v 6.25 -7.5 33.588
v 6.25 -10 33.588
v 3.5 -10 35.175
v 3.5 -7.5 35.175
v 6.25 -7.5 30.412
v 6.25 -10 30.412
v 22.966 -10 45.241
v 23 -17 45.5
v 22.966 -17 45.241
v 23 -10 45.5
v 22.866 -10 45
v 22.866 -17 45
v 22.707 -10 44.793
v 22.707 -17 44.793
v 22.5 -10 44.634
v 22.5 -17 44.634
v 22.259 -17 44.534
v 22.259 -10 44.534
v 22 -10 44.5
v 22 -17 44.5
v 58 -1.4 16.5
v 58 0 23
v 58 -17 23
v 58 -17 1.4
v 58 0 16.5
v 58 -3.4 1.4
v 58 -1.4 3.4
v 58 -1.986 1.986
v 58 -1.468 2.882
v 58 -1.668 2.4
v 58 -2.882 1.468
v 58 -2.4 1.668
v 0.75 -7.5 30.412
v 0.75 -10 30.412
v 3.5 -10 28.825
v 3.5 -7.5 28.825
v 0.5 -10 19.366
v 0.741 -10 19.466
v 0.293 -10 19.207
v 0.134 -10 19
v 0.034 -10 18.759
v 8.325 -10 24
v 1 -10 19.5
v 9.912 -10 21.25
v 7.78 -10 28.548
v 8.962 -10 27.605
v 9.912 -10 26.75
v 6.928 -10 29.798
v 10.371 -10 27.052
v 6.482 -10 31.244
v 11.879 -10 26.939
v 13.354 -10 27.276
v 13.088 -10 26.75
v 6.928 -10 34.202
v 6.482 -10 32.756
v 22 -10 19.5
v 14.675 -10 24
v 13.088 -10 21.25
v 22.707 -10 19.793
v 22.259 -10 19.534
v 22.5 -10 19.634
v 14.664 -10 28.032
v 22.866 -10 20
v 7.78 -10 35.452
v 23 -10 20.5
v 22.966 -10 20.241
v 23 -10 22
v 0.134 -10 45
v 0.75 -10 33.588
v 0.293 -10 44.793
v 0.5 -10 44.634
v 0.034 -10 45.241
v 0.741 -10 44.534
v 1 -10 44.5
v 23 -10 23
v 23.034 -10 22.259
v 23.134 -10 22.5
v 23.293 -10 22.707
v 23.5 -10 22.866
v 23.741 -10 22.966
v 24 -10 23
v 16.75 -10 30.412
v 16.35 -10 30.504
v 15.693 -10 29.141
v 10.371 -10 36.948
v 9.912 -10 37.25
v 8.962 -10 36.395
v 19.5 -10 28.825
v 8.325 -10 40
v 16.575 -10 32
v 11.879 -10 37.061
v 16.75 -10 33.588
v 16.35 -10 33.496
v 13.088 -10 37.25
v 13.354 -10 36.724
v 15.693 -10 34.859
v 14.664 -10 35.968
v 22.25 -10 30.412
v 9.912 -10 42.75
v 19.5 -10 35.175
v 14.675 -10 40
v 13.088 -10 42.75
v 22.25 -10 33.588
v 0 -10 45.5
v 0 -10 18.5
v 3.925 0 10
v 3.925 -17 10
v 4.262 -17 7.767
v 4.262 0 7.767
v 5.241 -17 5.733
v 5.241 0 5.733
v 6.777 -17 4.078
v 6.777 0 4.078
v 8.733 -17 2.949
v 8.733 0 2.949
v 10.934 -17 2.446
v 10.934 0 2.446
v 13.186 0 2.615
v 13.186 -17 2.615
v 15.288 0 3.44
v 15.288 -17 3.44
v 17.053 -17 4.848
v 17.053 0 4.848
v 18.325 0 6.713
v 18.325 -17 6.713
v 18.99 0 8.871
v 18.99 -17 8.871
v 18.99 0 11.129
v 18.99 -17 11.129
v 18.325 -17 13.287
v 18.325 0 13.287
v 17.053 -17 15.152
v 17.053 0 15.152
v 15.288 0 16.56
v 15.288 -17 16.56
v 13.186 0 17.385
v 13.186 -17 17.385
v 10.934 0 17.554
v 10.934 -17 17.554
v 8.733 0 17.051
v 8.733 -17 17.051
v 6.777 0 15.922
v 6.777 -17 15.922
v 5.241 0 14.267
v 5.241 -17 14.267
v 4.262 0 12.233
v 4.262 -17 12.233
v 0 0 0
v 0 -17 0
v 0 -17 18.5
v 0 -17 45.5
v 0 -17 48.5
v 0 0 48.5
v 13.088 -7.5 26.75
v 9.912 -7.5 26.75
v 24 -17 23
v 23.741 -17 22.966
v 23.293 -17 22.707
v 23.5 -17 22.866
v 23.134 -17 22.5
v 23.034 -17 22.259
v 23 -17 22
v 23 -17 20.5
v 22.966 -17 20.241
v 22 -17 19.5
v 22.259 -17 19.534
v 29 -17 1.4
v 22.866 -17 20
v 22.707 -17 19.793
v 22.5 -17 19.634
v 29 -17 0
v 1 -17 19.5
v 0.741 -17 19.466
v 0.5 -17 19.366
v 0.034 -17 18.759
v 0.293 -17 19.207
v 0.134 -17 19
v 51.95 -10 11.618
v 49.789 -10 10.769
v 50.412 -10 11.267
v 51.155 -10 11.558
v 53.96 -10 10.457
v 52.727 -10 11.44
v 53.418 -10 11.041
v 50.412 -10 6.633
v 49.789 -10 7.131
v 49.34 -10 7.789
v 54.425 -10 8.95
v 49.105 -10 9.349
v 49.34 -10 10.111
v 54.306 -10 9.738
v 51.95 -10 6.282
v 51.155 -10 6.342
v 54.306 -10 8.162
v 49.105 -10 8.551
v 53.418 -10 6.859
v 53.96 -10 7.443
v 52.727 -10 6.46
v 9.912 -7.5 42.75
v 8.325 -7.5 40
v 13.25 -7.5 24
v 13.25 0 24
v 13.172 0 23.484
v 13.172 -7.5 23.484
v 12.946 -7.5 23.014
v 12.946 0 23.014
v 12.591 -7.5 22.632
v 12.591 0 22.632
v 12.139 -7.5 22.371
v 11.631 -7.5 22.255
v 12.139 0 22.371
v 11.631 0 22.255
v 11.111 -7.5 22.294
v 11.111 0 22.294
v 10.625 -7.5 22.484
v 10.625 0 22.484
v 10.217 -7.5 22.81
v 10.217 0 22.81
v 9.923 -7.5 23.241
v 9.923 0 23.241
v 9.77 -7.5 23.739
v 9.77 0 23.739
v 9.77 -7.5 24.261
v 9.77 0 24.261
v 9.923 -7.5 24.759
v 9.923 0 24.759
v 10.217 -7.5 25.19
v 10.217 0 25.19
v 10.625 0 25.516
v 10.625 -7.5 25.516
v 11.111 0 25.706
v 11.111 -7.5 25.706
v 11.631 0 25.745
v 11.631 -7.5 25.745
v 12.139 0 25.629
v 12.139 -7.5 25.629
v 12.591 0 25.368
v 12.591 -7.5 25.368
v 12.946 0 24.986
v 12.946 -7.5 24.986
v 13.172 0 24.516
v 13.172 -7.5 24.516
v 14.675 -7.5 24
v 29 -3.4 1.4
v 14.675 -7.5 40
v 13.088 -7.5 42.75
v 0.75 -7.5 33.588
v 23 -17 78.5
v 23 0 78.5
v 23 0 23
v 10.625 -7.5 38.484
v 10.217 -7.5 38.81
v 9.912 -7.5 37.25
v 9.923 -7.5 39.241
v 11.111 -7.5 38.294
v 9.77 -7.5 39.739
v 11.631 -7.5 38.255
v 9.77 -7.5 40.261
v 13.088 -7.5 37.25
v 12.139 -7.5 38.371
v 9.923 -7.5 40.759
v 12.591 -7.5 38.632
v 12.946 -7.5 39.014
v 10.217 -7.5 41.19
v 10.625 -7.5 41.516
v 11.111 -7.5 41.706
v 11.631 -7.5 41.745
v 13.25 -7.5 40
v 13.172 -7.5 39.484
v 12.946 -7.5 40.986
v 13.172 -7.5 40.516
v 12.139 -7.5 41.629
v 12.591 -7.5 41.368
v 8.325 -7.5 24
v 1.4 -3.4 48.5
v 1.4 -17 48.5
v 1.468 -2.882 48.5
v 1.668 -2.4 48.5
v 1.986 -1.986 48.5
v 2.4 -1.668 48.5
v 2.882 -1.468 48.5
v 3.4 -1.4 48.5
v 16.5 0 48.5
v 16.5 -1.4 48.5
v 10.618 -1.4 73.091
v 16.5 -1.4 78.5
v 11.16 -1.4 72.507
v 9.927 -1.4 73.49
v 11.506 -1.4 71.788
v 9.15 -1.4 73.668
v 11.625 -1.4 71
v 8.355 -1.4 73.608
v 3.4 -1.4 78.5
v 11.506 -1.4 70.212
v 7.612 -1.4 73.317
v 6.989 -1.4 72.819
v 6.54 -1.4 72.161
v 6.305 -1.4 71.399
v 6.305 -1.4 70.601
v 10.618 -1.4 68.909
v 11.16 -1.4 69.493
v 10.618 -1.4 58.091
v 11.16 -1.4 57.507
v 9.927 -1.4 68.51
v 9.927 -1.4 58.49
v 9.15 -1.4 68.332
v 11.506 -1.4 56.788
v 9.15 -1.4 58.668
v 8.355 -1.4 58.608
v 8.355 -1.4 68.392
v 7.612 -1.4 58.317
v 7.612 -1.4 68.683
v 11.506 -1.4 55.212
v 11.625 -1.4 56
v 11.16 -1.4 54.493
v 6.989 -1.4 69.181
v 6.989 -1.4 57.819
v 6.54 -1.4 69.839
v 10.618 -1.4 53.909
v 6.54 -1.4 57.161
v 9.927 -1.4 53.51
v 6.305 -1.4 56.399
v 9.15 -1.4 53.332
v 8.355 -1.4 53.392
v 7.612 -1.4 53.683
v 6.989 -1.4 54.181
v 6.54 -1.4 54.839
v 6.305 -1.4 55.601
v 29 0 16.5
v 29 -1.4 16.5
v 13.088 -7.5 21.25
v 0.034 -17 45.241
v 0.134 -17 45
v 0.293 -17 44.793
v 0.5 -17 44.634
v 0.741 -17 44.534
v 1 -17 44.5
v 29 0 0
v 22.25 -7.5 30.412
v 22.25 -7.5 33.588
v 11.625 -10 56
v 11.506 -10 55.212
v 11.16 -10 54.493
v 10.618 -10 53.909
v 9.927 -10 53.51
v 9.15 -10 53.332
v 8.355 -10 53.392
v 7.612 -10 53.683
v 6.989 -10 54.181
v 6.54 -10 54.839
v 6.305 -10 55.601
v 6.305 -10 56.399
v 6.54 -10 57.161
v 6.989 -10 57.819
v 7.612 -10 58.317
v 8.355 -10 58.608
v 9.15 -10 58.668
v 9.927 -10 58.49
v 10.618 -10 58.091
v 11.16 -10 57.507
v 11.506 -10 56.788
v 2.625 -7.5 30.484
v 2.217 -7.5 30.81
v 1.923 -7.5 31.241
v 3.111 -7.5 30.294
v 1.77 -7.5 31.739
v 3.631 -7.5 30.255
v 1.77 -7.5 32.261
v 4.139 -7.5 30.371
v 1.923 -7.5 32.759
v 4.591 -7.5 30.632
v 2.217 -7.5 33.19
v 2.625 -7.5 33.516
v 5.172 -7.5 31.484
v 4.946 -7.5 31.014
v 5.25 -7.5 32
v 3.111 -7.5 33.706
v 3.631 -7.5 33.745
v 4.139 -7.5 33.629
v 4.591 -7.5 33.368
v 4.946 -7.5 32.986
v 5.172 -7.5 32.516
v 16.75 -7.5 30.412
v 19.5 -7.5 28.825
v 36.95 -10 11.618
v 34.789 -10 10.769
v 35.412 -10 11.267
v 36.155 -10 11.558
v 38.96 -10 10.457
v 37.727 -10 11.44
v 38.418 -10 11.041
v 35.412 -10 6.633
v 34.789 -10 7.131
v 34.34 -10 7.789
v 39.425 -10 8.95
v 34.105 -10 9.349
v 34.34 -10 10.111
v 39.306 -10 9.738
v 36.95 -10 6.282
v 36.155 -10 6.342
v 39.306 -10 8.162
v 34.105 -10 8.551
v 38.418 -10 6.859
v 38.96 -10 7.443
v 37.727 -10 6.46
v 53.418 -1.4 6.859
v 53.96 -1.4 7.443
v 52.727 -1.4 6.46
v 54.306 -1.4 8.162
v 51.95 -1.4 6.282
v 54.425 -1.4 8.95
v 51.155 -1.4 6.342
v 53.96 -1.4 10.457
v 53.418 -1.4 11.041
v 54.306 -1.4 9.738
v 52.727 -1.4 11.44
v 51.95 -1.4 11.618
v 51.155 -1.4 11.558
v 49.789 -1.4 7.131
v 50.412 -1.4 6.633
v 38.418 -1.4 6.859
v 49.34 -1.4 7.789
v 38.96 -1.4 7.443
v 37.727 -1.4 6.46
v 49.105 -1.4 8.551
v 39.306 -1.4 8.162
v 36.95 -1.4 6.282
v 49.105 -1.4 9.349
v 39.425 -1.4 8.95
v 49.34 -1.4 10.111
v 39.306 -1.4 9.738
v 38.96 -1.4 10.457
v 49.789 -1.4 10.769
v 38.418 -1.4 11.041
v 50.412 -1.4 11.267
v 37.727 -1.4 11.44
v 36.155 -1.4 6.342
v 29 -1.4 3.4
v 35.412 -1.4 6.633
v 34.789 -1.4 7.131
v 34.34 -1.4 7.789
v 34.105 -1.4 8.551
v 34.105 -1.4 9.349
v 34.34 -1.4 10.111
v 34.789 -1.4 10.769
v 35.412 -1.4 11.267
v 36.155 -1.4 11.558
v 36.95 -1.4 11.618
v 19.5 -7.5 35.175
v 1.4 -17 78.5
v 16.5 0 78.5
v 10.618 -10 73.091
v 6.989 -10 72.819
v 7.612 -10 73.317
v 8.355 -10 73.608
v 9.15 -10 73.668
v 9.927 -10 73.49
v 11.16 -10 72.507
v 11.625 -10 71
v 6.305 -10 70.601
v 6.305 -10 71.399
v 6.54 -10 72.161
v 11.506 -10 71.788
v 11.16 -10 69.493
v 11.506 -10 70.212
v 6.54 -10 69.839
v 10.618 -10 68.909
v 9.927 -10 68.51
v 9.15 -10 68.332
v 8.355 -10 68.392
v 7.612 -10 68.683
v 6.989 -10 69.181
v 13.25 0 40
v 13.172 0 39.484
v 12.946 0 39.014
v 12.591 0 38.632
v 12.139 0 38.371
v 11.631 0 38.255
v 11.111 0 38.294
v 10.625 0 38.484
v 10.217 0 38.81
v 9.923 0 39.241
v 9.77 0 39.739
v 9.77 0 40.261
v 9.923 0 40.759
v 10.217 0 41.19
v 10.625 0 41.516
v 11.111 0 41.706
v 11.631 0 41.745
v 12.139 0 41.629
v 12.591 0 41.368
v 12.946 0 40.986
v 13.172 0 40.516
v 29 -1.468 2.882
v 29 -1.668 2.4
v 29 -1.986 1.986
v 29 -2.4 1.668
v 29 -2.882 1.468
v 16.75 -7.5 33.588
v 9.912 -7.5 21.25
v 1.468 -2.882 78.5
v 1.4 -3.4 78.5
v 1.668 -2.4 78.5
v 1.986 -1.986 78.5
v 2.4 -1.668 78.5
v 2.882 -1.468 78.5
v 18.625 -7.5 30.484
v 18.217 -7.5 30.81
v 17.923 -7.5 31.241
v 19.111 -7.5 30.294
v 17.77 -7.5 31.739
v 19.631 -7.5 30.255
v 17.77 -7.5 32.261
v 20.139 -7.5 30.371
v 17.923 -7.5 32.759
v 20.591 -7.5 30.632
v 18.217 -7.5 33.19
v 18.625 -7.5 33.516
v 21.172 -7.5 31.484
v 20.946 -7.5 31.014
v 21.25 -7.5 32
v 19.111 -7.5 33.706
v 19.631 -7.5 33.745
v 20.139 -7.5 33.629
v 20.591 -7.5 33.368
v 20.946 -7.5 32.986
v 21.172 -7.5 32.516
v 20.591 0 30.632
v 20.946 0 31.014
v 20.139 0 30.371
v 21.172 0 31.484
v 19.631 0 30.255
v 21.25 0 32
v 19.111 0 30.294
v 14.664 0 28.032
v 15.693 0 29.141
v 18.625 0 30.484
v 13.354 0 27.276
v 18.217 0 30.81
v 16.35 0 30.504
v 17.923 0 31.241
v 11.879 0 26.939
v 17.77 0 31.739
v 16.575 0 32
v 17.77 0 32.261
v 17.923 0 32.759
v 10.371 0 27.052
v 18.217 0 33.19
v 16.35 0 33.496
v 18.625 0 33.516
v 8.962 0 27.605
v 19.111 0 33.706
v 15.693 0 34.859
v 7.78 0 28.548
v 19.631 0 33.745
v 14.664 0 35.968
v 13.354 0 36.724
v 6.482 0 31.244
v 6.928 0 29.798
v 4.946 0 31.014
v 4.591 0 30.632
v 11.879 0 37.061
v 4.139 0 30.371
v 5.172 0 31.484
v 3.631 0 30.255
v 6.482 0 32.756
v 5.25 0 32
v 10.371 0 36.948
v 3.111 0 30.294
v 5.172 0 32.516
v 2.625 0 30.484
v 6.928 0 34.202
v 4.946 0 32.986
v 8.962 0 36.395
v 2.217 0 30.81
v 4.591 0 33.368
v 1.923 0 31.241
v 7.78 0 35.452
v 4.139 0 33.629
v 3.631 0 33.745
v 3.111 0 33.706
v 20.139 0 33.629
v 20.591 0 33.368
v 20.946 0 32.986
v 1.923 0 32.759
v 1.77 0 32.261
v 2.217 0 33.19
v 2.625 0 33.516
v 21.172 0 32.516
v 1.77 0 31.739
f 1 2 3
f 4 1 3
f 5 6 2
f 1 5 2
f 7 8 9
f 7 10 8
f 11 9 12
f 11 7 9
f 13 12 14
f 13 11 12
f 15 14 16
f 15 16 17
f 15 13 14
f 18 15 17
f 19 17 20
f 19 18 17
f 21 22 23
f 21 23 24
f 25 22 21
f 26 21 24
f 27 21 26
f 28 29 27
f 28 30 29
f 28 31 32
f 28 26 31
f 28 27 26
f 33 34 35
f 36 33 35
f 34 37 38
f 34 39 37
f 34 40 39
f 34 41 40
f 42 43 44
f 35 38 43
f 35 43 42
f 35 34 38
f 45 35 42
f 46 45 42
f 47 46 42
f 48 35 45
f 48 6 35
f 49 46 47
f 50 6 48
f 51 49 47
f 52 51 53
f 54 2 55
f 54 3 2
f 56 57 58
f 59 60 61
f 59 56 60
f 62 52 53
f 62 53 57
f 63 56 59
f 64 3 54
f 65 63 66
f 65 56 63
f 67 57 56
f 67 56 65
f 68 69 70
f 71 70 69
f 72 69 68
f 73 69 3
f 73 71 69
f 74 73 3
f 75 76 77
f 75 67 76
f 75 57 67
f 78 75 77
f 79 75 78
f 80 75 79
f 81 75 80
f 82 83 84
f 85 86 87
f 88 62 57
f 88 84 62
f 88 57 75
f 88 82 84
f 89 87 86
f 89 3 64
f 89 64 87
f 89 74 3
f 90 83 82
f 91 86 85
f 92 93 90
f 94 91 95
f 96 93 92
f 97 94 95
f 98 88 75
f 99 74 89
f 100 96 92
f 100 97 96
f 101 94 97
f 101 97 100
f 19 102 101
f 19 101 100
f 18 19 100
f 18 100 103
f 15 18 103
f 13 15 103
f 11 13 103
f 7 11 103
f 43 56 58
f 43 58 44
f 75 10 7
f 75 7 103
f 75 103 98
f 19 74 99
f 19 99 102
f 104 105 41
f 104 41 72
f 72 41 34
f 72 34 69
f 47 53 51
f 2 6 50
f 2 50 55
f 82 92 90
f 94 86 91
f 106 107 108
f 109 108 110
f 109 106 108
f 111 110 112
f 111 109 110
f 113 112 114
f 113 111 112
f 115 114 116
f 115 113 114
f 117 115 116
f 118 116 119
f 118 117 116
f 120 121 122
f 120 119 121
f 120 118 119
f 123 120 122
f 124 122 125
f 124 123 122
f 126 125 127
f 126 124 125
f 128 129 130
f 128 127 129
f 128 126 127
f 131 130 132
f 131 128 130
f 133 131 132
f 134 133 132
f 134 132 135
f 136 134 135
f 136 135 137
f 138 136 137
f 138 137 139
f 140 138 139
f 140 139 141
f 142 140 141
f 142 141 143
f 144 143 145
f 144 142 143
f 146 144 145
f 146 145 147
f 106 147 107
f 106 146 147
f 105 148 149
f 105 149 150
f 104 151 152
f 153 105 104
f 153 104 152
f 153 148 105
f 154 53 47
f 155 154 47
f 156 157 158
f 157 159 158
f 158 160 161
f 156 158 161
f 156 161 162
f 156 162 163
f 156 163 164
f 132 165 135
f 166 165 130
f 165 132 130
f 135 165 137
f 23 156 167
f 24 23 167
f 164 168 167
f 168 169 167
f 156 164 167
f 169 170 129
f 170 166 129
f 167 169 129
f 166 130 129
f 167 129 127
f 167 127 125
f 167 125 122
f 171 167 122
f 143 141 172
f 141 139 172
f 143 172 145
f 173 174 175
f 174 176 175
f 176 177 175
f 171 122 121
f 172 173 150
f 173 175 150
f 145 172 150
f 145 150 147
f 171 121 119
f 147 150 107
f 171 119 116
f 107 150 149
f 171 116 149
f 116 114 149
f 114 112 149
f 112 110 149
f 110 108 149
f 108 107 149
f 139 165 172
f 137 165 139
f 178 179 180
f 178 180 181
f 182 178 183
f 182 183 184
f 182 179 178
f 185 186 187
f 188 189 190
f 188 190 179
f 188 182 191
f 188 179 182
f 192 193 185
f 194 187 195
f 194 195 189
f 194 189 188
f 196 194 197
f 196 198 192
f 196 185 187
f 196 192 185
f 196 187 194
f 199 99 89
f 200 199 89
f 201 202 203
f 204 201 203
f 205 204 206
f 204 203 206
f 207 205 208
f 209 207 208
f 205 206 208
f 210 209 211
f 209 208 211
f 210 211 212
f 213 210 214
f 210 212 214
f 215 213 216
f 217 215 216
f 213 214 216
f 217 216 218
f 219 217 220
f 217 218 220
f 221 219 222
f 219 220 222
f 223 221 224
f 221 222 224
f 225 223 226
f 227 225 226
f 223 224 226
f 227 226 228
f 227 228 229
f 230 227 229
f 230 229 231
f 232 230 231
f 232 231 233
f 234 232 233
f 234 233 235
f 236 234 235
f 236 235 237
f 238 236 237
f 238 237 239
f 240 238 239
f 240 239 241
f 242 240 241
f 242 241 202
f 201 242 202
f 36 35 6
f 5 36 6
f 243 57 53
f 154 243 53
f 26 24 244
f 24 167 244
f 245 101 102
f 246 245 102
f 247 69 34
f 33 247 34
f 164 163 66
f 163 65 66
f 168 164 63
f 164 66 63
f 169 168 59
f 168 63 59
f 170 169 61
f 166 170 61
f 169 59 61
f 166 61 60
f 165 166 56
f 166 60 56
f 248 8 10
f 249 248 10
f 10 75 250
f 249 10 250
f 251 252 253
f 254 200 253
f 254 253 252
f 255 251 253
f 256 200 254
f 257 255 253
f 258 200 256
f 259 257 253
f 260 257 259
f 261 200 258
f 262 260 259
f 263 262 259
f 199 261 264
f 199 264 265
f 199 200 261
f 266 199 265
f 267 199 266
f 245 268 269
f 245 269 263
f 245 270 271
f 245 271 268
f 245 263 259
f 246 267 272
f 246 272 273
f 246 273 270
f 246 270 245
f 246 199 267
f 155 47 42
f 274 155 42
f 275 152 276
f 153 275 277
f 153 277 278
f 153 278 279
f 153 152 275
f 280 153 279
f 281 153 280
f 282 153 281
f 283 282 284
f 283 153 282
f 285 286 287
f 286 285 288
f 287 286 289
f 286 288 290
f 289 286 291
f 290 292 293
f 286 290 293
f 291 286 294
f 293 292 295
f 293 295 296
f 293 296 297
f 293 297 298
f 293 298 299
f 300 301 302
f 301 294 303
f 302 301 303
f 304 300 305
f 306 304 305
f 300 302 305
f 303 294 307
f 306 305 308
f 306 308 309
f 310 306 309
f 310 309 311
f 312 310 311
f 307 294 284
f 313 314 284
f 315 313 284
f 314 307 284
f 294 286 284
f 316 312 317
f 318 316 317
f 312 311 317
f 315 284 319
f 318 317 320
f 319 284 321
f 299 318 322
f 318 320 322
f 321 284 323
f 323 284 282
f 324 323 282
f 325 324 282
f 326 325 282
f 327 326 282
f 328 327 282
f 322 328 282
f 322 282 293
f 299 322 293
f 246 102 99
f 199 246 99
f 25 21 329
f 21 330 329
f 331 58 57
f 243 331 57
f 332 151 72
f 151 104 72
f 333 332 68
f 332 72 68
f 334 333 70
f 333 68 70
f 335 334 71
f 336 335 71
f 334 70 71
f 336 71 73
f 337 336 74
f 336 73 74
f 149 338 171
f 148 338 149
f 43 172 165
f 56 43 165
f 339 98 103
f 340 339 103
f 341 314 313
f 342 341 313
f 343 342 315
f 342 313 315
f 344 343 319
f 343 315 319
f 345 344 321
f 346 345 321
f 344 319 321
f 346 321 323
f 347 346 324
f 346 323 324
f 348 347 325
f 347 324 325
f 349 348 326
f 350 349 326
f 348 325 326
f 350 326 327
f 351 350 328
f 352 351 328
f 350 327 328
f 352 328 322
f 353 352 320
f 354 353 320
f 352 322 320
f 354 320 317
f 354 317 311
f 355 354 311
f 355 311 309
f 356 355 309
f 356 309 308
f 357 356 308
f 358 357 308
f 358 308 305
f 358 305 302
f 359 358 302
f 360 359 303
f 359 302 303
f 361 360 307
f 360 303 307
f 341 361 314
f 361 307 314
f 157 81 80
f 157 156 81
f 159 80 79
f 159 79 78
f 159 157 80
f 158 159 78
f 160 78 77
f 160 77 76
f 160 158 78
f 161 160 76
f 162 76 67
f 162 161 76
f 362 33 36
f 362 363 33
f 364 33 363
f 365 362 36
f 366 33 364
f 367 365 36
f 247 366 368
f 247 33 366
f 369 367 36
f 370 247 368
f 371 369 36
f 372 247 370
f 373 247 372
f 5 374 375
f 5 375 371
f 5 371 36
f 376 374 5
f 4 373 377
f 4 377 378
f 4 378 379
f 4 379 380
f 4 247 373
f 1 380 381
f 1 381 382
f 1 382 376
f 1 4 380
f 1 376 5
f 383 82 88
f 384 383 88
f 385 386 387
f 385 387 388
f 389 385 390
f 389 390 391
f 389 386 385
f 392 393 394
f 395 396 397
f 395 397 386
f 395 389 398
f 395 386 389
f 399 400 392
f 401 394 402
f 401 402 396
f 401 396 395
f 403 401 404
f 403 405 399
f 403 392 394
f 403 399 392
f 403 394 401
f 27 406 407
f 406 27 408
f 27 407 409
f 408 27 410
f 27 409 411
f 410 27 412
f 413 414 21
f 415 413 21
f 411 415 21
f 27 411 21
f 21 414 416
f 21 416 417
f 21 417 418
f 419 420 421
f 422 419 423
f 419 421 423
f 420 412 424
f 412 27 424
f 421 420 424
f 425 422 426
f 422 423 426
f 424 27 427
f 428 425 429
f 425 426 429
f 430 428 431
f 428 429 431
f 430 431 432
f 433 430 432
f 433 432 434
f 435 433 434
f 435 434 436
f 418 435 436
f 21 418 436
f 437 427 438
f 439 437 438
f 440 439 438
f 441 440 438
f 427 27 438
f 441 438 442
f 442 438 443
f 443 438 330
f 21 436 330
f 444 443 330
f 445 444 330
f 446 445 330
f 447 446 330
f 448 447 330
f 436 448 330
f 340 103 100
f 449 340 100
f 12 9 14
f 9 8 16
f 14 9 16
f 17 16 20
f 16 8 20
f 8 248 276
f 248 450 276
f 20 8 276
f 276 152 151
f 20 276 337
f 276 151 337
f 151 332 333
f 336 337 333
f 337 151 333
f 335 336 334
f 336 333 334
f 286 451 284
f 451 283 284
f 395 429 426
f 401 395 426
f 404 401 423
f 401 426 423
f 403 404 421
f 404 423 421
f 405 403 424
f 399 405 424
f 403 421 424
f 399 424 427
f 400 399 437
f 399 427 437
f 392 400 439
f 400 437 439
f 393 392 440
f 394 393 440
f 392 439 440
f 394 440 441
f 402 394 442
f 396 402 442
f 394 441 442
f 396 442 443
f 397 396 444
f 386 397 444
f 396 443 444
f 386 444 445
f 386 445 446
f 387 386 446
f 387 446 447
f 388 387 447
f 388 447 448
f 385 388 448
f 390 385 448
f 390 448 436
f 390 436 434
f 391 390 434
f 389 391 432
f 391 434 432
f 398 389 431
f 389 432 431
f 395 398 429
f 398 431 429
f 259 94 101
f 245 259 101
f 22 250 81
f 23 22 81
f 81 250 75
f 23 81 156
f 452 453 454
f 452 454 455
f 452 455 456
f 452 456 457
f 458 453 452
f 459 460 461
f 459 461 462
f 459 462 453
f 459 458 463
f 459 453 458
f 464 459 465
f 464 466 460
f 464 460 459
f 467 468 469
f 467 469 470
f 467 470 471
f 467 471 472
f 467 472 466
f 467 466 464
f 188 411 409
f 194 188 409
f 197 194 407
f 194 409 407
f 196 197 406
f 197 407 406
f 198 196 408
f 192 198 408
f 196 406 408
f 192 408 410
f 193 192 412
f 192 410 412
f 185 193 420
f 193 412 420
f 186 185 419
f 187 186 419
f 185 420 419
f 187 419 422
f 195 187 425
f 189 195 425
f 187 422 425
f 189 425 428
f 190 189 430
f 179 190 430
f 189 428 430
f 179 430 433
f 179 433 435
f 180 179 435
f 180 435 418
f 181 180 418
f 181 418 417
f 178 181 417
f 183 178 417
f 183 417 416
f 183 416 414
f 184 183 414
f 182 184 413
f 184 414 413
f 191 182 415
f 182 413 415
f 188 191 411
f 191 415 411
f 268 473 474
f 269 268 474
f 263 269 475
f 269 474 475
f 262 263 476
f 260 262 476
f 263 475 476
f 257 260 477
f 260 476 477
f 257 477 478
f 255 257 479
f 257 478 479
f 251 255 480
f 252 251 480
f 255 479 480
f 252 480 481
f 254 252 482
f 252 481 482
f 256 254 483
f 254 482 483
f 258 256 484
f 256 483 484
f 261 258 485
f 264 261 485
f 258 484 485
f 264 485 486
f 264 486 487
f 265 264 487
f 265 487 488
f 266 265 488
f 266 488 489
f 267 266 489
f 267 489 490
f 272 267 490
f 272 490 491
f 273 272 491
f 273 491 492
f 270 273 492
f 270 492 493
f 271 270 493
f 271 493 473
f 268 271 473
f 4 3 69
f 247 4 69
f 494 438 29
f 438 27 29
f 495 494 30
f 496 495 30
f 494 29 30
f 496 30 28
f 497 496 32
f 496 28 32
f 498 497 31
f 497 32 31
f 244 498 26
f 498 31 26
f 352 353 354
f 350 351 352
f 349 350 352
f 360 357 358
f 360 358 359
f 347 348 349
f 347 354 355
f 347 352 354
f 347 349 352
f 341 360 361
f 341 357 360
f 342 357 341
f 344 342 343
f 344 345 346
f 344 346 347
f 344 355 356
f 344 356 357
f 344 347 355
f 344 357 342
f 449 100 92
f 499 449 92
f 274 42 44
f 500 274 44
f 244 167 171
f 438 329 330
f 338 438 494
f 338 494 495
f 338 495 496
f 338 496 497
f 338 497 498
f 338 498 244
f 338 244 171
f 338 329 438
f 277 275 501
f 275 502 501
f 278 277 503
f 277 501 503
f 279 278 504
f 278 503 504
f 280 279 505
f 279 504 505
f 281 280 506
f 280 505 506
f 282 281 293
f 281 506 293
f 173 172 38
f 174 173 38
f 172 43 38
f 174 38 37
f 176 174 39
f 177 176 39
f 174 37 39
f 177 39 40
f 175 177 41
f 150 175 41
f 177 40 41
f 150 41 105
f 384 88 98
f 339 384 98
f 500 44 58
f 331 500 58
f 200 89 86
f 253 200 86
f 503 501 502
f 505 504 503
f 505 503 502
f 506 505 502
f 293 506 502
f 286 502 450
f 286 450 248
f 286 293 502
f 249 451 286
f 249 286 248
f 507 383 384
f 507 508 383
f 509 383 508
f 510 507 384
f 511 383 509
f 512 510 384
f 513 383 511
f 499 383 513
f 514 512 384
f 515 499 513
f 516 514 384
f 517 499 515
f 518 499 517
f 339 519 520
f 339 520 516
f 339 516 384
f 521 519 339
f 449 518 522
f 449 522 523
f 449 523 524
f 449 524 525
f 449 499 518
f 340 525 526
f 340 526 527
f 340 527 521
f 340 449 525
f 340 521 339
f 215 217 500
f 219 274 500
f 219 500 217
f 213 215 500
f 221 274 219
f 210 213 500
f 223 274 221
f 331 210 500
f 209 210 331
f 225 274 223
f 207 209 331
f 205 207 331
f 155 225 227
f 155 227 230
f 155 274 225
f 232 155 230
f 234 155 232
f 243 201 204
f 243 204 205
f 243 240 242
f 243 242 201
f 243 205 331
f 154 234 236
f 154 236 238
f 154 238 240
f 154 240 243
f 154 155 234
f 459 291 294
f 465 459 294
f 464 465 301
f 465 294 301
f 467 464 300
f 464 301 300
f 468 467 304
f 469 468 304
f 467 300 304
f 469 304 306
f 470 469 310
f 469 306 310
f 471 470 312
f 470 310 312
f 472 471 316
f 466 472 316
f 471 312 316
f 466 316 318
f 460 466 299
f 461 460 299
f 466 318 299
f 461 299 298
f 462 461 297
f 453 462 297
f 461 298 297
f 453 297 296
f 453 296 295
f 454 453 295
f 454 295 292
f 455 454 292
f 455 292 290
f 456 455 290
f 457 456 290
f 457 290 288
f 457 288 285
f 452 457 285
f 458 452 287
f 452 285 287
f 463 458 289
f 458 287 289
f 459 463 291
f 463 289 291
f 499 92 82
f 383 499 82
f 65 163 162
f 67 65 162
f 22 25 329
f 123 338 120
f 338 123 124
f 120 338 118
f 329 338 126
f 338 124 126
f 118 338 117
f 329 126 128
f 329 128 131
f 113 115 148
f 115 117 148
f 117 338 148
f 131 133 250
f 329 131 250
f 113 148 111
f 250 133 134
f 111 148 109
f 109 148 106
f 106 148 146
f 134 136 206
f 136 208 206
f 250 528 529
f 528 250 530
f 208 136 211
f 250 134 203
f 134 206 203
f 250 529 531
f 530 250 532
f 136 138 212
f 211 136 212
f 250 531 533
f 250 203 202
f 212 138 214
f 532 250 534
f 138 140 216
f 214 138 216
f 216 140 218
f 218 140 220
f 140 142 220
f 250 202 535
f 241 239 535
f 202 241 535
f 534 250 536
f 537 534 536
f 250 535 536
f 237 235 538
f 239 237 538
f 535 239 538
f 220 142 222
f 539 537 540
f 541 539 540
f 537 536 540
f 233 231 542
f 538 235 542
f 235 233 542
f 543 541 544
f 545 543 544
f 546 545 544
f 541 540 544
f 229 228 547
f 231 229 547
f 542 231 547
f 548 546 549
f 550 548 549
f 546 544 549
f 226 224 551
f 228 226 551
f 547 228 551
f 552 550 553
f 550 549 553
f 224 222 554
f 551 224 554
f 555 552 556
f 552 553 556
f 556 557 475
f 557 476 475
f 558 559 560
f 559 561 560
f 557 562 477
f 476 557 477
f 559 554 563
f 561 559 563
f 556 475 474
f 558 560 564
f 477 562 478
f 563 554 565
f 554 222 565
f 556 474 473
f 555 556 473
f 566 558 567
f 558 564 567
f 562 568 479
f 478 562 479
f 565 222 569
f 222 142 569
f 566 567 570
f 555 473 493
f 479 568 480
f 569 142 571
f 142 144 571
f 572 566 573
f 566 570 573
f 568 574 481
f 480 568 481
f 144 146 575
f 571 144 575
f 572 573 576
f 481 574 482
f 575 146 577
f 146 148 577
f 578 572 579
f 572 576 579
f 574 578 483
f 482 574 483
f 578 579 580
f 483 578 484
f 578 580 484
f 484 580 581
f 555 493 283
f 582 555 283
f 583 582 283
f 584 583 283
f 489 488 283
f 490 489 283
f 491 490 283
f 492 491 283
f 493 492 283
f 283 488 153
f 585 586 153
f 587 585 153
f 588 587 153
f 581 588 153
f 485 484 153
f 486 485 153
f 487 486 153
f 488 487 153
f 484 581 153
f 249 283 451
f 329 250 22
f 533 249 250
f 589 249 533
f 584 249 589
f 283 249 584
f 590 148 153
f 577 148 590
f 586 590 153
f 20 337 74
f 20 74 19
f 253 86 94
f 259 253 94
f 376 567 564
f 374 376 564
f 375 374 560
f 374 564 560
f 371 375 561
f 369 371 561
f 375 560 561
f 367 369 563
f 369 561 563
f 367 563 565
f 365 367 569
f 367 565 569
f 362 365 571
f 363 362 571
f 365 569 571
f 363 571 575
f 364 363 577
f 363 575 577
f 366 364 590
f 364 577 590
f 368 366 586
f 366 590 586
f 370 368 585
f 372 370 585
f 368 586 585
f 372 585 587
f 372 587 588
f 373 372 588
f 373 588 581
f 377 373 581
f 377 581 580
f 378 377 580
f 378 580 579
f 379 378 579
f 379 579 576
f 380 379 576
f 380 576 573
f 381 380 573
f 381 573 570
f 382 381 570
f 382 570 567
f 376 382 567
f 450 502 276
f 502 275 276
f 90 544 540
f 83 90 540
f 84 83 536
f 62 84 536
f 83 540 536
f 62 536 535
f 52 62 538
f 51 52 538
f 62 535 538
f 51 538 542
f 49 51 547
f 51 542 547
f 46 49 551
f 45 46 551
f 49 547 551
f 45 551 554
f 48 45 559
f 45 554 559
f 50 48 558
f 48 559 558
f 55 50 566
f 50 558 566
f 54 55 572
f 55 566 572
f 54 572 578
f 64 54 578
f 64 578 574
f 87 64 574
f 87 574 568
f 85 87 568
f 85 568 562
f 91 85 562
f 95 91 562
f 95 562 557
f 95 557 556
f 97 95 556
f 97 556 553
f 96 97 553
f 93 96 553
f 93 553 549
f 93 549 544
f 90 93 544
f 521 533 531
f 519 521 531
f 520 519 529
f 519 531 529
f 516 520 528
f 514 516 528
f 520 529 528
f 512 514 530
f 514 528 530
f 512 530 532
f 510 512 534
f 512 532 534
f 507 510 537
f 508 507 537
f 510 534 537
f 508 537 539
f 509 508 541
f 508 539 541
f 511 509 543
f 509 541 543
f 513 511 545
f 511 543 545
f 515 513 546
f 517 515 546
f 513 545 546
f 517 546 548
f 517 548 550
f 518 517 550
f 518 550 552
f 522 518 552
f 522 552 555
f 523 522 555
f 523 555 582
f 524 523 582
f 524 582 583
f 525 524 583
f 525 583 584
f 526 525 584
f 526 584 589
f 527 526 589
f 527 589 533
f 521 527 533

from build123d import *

# Parameters (mm, degrees)
SALIENTE_EXTRUIR2_DEPTH = 17
CROQUIS4_R              = 7.575
CORTAR_EXTRUIR7_DEPTH   = 18
CROQUIS12_R             = 5.075
CORTAR_EXTRUIR12_DEPTH  = 18
CROQUIS17_R             = 1.75
CORTAR_EXTRUIR15_DEPTH  = 18
CORTAR_EXTRUIR9_DEPTH   = 14
CORTAR_EXTRUIR10_DEPTH  = 15
CROQUIS10_R             = 2.675
CORTAR_EXTRUIR11_DEPTH  = 8.6
SALIENTE_EXTRUIR3_DEPTH = 15
SALIENTE_EXTRUIR4_DEPTH = 15
CROQUIS16_R             = 2.675
CORTAR_EXTRUIR14_DEPTH  = 8.6
CROQUIS18_W             = 23
CROQUIS18_H             = 25
CORTAR_EXTRUIR16_DEPTH  = 7
CORTAR_EXTRUIR17_DEPTH  = 2.5
REDONDEO2_R             = 1
REDONDEO4_R             = 2


with BuildPart() as part:
    # Croquis1 → Saliente-Extruir2 (new body)
    with BuildSketch(Plane(origin=(0, 0, 0), x_dir=(1, 0, 0), z_dir=(0, 1, 0))):
        Polygon((23, -63.5), (23, -23), (43, -23), (43, 0), (0, 0), (0, -63.5), align=None)
    extrude(amount=-SALIENTE_EXTRUIR2_DEPTH)

    # Croquis4 → Cortar-Extruir7 (cut, through all)
    with BuildSketch(Plane(origin=(0, 0, 0), x_dir=(-1, 0, 0), z_dir=(0, -1, 0))):
        with Locations((-11.5, -10)):
            Circle(CROQUIS4_R)
    extrude(amount=CORTAR_EXTRUIR7_DEPTH, mode=Mode.SUBTRACT)

    # Croquis12 → Cortar-Extruir12 (cut, through all)
    with BuildSketch(Plane(origin=(0, 0, 0), x_dir=(1, 0, 0), z_dir=(0, 1, 0))):
        with Locations((11.5, -32)):
            Circle(CROQUIS12_R)
    extrude(amount=-CORTAR_EXTRUIR12_DEPTH, mode=Mode.SUBTRACT)

    # Croquis17 → Cortar-Extruir15 (cut, through all)
    with BuildSketch(Plane(origin=(0, 0, 0), x_dir=(1, 0, 0), z_dir=(0, 1, 0))):
        with Locations((11.5, -24)):
            Circle(CROQUIS17_R)
        with Locations((11.5, -40)):
            Circle(CROQUIS17_R)
        with Locations((3.5, -32)):
            Circle(CROQUIS17_R)
        with Locations((19.5, -32)):
            Circle(CROQUIS17_R)
    extrude(amount=-CORTAR_EXTRUIR15_DEPTH, mode=Mode.SUBTRACT)

    # Croquis8 → Cortar-Extruir9 (cut)
    with BuildSketch(Plane(origin=(43, 0, 0), x_dir=(0, 0, -1), z_dir=(1, 0, 0))):
        Polygon((0, -17), (0, 0), (-16.5, 0), (-16.5, -1.4), (-1.4, -1.4), (-1.4, -17), align=None)
    extrude(amount=-CORTAR_EXTRUIR9_DEPTH, mode=Mode.SUBTRACT)

    # Croquis9 → Cortar-Extruir10 (cut)
    with BuildSketch(Plane(origin=(0, 0, 63.5), x_dir=(-1, 0, 0), z_dir=(0, 0, -1))):
        Polygon((0, -17), (-1.4, -17), (-1.4, -1.4), (-16.5, -1.4), (-16.5, 0), (0, 0), align=None)
    extrude(amount=CORTAR_EXTRUIR10_DEPTH, mode=Mode.SUBTRACT)

    # Croquis10 → Cortar-Extruir11 (cut)
    with BuildSketch(Plane(origin=(0, -1.4, 0), x_dir=(1, 0, 0), z_dir=(0, 1, 0))):
        with Locations((36.75, -8.95)):
            Circle(CROQUIS10_R)
        with Locations((8.95, -56)):
            Circle(CROQUIS10_R)
    extrude(amount=-CORTAR_EXTRUIR11_DEPTH, mode=Mode.SUBTRACT)

    # Croquis14 → Saliente-Extruir3 (add)
    with BuildSketch(Plane.XY.offset(63.5)):
        Polygon((23, 0), (16.5, 0), (16.5, -1.4), (1.4, -1.4), (1.4, -17), (23, -17), align=None)
    extrude(amount=SALIENTE_EXTRUIR3_DEPTH)

    # Croquis15 → Saliente-Extruir4 (add)
    with BuildSketch(Plane(origin=(43, 0, 0), x_dir=(0, 0, -1), z_dir=(1, 0, 0))):
        Polygon((-1.4, -17), (-1.4, -1.4), (-16.5, -1.4), (-16.5, 0), (-23, 0), (-23, -17), align=None)
    extrude(amount=SALIENTE_EXTRUIR4_DEPTH)

    # Croquis16 → Cortar-Extruir14 (cut)
    with BuildSketch(Plane(origin=(0, -1.4, 0), x_dir=(1, 0, 0), z_dir=(0, 1, 0))):
        with Locations((8.95, -71)):
            Circle(CROQUIS16_R)
        with Locations((51.75, -8.95)):
            Circle(CROQUIS16_R)
    extrude(amount=-CORTAR_EXTRUIR14_DEPTH, mode=Mode.SUBTRACT)

    # Croquis18 → Cortar-Extruir16 (cut)
    with BuildSketch(Plane.XZ.offset(17)):
        with Locations((11.5, 32)):
            Rectangle(CROQUIS18_W, CROQUIS18_H)
    extrude(amount=-CORTAR_EXTRUIR16_DEPTH, mode=Mode.SUBTRACT)

    # Croquis19 → Cortar-Extruir17 (cut)
    with BuildSketch(Plane.XZ.offset(10)):
        Polygon((14.675426481, 40), (13.08771324, 42.75), (9.91228676, 42.75), (8.324573519, 40), (9.91228676, 37.25), (13.08771324, 37.25), align=None)
        Polygon((22.25, 30.41228676), (22.25, 33.58771324), (19.5, 35.175426481), (16.75, 33.58771324), (16.75, 30.41228676), (19.5, 28.824573519), align=None)
        Polygon((14.675426481, 24), (13.08771324, 26.75), (9.91228676, 26.75), (8.324573519, 24), (9.91228676, 21.25), (13.08771324, 21.25), align=None)
        Polygon((0.75, 33.58771324), (0.75, 30.41228676), (3.5, 28.824573519), (6.25, 30.41228676), (6.25, 33.58771324), (3.5, 35.175426481), align=None)
    extrude(amount=-CORTAR_EXTRUIR17_DEPTH, mode=Mode.SUBTRACT)

    # Redondeo2
    redondeo2_edges = [part.edges().sort_by_distance(p)[0] for p in [
        (23, -13.5, 23),
        (23, -13.5, 44.5),
        (0, -13.5, 44.5),
        (23, -13.5, 19.5),
        (0, -13.5, 19.5),
    ]]
    fillet(redondeo2_edges, radius=REDONDEO2_R)

    # Redondeo4
    redondeo4_edges = [part.edges().sort_by_distance(p)[0] for p in [
        (43.5, -1.4, 1.4),
        (1.4, -1.4, 63.5),
    ]]
    fillet(redondeo4_edges, radius=REDONDEO4_R)


solid = part.part
